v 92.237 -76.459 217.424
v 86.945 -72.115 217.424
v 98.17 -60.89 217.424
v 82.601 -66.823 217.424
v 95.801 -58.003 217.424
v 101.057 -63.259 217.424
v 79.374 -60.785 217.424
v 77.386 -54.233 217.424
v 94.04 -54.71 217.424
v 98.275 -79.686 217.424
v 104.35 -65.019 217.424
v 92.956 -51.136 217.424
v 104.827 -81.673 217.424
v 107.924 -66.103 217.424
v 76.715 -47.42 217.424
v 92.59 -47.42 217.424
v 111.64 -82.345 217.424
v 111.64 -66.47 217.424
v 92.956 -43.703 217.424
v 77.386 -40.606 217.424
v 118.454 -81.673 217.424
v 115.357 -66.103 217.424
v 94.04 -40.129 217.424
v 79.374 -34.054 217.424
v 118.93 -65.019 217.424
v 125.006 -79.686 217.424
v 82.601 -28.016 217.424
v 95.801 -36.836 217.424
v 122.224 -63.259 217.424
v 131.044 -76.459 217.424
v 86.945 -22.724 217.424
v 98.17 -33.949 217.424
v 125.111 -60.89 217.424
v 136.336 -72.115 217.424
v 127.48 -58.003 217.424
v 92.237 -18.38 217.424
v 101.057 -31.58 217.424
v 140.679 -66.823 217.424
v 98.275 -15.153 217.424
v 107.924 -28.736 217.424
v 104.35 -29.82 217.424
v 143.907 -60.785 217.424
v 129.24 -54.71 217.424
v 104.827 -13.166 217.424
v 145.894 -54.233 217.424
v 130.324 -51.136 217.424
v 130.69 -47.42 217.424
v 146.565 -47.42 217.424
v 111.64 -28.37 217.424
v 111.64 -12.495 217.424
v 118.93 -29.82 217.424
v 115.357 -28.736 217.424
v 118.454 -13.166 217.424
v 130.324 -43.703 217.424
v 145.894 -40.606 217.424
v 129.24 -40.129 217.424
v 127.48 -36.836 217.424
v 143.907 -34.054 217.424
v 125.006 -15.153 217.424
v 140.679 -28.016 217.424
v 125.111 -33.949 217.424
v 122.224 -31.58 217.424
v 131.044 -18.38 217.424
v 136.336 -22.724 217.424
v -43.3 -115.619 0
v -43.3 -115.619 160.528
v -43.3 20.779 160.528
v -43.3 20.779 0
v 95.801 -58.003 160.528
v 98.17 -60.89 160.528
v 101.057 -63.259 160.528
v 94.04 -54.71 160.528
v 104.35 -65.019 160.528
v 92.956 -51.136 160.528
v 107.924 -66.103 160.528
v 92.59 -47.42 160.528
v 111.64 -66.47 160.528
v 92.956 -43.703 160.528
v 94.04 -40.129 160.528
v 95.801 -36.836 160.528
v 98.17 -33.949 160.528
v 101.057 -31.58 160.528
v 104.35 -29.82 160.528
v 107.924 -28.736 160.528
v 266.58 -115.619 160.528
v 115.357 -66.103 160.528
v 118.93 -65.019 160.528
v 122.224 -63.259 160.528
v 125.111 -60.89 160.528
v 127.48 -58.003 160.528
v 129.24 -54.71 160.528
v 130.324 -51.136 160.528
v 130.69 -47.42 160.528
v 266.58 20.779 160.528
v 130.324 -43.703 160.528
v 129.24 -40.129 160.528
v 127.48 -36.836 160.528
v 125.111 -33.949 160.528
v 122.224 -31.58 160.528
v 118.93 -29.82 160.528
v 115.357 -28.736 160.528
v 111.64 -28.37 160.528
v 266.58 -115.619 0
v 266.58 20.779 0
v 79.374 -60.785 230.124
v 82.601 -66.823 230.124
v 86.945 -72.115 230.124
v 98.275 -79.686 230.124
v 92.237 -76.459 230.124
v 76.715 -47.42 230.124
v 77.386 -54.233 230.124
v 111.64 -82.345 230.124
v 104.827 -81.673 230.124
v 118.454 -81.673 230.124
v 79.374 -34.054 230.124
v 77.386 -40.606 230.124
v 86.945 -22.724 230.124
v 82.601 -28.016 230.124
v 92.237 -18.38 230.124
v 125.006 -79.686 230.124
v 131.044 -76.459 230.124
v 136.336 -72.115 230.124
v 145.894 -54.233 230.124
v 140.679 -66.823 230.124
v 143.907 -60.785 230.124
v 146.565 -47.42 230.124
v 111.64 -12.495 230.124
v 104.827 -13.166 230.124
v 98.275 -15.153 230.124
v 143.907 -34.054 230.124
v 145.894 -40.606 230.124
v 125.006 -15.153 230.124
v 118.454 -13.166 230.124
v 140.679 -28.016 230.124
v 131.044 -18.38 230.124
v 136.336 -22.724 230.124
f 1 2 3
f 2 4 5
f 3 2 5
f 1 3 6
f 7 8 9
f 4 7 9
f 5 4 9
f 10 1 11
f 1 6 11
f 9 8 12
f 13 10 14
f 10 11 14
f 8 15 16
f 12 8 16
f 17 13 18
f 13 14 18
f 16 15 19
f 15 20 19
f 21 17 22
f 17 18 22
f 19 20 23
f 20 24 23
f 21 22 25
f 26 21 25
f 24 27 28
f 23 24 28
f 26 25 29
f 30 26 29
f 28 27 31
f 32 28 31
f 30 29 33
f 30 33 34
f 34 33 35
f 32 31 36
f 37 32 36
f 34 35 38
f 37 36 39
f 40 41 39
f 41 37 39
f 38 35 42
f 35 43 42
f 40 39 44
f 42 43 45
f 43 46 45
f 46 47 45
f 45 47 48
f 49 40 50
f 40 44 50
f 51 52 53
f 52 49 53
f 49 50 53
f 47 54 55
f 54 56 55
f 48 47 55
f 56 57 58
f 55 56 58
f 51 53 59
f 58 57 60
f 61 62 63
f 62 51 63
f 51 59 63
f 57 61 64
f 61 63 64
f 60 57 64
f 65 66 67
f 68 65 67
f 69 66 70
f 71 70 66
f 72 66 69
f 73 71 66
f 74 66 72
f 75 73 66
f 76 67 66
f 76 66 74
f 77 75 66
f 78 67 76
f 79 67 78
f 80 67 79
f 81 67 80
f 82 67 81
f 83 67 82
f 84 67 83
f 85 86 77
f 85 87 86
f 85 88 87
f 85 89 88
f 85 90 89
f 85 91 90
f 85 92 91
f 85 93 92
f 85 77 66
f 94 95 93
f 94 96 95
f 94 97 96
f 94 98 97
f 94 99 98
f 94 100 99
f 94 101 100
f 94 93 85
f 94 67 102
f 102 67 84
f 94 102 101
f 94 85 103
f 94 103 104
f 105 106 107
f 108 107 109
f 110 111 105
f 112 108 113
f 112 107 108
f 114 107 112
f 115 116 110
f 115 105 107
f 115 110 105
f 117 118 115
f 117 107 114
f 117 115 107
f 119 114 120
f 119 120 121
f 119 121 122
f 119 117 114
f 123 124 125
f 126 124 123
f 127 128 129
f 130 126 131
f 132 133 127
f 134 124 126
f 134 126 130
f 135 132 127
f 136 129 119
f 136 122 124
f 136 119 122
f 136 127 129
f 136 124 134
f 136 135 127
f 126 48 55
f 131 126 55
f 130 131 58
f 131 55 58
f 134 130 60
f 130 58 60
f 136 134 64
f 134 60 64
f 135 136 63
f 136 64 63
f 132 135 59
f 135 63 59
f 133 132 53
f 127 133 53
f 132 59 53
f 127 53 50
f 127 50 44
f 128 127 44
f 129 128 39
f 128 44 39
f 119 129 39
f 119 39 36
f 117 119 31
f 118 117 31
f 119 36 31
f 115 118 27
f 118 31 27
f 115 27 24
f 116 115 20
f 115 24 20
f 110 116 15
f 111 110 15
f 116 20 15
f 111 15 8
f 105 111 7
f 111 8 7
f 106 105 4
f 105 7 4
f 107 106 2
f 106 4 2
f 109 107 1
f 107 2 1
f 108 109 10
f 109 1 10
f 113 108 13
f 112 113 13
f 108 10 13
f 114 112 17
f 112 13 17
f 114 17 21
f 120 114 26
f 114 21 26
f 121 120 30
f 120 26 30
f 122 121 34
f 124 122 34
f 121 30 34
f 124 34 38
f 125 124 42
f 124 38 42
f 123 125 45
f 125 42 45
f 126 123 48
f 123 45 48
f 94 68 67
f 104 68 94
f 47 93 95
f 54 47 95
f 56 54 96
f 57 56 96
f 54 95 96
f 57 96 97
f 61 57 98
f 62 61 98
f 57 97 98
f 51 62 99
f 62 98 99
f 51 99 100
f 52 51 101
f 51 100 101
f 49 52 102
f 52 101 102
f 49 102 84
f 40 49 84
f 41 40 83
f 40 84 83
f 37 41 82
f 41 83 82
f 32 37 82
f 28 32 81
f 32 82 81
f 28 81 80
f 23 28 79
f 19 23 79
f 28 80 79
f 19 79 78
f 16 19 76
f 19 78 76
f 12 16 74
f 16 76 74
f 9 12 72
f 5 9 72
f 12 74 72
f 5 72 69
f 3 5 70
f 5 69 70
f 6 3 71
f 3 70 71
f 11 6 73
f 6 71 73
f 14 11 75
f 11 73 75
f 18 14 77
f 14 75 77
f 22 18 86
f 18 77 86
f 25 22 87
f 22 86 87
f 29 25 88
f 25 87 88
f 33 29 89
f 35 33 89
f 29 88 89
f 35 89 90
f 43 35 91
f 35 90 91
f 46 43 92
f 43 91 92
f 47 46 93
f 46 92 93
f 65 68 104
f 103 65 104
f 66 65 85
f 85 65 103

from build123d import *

# Parameters (mm, degrees)
SKETCH1_W           = 309.88
SKETCH1_H           = 136.398
BOSS_EXTRUDE1_DEPTH = 160.528
SKETCH2_R           = 19.05
BOSS_EXTRUDE2_DEPTH = 56.896
SKETCH3_R           = 34.925
BOSS_EXTRUDE3_DEPTH = 12.7


with BuildPart() as part:
    # Sketch1 → Boss-Extrude1 (new body)
    with BuildSketch(Plane.XY):
        with Locations((111.640327538, -47.419508944)):
            Rectangle(SKETCH1_W, SKETCH1_H)
    extrude(amount=BOSS_EXTRUDE1_DEPTH)

    # Sketch2 → Boss-Extrude2 (add)
    with BuildSketch(Plane.XY.offset(160.528)):
        with Locations((111.640327538, -47.419508944)):
            Circle(SKETCH2_R)
    extrude(amount=BOSS_EXTRUDE2_DEPTH)

    # Sketch3 → Boss-Extrude3 (add)
    with BuildSketch(Plane.XY.offset(217.424)):
        with Locations((111.640327538, -47.419508944)):
            Circle(SKETCH3_R)
    extrude(amount=BOSS_EXTRUDE3_DEPTH)


solid = part.part
